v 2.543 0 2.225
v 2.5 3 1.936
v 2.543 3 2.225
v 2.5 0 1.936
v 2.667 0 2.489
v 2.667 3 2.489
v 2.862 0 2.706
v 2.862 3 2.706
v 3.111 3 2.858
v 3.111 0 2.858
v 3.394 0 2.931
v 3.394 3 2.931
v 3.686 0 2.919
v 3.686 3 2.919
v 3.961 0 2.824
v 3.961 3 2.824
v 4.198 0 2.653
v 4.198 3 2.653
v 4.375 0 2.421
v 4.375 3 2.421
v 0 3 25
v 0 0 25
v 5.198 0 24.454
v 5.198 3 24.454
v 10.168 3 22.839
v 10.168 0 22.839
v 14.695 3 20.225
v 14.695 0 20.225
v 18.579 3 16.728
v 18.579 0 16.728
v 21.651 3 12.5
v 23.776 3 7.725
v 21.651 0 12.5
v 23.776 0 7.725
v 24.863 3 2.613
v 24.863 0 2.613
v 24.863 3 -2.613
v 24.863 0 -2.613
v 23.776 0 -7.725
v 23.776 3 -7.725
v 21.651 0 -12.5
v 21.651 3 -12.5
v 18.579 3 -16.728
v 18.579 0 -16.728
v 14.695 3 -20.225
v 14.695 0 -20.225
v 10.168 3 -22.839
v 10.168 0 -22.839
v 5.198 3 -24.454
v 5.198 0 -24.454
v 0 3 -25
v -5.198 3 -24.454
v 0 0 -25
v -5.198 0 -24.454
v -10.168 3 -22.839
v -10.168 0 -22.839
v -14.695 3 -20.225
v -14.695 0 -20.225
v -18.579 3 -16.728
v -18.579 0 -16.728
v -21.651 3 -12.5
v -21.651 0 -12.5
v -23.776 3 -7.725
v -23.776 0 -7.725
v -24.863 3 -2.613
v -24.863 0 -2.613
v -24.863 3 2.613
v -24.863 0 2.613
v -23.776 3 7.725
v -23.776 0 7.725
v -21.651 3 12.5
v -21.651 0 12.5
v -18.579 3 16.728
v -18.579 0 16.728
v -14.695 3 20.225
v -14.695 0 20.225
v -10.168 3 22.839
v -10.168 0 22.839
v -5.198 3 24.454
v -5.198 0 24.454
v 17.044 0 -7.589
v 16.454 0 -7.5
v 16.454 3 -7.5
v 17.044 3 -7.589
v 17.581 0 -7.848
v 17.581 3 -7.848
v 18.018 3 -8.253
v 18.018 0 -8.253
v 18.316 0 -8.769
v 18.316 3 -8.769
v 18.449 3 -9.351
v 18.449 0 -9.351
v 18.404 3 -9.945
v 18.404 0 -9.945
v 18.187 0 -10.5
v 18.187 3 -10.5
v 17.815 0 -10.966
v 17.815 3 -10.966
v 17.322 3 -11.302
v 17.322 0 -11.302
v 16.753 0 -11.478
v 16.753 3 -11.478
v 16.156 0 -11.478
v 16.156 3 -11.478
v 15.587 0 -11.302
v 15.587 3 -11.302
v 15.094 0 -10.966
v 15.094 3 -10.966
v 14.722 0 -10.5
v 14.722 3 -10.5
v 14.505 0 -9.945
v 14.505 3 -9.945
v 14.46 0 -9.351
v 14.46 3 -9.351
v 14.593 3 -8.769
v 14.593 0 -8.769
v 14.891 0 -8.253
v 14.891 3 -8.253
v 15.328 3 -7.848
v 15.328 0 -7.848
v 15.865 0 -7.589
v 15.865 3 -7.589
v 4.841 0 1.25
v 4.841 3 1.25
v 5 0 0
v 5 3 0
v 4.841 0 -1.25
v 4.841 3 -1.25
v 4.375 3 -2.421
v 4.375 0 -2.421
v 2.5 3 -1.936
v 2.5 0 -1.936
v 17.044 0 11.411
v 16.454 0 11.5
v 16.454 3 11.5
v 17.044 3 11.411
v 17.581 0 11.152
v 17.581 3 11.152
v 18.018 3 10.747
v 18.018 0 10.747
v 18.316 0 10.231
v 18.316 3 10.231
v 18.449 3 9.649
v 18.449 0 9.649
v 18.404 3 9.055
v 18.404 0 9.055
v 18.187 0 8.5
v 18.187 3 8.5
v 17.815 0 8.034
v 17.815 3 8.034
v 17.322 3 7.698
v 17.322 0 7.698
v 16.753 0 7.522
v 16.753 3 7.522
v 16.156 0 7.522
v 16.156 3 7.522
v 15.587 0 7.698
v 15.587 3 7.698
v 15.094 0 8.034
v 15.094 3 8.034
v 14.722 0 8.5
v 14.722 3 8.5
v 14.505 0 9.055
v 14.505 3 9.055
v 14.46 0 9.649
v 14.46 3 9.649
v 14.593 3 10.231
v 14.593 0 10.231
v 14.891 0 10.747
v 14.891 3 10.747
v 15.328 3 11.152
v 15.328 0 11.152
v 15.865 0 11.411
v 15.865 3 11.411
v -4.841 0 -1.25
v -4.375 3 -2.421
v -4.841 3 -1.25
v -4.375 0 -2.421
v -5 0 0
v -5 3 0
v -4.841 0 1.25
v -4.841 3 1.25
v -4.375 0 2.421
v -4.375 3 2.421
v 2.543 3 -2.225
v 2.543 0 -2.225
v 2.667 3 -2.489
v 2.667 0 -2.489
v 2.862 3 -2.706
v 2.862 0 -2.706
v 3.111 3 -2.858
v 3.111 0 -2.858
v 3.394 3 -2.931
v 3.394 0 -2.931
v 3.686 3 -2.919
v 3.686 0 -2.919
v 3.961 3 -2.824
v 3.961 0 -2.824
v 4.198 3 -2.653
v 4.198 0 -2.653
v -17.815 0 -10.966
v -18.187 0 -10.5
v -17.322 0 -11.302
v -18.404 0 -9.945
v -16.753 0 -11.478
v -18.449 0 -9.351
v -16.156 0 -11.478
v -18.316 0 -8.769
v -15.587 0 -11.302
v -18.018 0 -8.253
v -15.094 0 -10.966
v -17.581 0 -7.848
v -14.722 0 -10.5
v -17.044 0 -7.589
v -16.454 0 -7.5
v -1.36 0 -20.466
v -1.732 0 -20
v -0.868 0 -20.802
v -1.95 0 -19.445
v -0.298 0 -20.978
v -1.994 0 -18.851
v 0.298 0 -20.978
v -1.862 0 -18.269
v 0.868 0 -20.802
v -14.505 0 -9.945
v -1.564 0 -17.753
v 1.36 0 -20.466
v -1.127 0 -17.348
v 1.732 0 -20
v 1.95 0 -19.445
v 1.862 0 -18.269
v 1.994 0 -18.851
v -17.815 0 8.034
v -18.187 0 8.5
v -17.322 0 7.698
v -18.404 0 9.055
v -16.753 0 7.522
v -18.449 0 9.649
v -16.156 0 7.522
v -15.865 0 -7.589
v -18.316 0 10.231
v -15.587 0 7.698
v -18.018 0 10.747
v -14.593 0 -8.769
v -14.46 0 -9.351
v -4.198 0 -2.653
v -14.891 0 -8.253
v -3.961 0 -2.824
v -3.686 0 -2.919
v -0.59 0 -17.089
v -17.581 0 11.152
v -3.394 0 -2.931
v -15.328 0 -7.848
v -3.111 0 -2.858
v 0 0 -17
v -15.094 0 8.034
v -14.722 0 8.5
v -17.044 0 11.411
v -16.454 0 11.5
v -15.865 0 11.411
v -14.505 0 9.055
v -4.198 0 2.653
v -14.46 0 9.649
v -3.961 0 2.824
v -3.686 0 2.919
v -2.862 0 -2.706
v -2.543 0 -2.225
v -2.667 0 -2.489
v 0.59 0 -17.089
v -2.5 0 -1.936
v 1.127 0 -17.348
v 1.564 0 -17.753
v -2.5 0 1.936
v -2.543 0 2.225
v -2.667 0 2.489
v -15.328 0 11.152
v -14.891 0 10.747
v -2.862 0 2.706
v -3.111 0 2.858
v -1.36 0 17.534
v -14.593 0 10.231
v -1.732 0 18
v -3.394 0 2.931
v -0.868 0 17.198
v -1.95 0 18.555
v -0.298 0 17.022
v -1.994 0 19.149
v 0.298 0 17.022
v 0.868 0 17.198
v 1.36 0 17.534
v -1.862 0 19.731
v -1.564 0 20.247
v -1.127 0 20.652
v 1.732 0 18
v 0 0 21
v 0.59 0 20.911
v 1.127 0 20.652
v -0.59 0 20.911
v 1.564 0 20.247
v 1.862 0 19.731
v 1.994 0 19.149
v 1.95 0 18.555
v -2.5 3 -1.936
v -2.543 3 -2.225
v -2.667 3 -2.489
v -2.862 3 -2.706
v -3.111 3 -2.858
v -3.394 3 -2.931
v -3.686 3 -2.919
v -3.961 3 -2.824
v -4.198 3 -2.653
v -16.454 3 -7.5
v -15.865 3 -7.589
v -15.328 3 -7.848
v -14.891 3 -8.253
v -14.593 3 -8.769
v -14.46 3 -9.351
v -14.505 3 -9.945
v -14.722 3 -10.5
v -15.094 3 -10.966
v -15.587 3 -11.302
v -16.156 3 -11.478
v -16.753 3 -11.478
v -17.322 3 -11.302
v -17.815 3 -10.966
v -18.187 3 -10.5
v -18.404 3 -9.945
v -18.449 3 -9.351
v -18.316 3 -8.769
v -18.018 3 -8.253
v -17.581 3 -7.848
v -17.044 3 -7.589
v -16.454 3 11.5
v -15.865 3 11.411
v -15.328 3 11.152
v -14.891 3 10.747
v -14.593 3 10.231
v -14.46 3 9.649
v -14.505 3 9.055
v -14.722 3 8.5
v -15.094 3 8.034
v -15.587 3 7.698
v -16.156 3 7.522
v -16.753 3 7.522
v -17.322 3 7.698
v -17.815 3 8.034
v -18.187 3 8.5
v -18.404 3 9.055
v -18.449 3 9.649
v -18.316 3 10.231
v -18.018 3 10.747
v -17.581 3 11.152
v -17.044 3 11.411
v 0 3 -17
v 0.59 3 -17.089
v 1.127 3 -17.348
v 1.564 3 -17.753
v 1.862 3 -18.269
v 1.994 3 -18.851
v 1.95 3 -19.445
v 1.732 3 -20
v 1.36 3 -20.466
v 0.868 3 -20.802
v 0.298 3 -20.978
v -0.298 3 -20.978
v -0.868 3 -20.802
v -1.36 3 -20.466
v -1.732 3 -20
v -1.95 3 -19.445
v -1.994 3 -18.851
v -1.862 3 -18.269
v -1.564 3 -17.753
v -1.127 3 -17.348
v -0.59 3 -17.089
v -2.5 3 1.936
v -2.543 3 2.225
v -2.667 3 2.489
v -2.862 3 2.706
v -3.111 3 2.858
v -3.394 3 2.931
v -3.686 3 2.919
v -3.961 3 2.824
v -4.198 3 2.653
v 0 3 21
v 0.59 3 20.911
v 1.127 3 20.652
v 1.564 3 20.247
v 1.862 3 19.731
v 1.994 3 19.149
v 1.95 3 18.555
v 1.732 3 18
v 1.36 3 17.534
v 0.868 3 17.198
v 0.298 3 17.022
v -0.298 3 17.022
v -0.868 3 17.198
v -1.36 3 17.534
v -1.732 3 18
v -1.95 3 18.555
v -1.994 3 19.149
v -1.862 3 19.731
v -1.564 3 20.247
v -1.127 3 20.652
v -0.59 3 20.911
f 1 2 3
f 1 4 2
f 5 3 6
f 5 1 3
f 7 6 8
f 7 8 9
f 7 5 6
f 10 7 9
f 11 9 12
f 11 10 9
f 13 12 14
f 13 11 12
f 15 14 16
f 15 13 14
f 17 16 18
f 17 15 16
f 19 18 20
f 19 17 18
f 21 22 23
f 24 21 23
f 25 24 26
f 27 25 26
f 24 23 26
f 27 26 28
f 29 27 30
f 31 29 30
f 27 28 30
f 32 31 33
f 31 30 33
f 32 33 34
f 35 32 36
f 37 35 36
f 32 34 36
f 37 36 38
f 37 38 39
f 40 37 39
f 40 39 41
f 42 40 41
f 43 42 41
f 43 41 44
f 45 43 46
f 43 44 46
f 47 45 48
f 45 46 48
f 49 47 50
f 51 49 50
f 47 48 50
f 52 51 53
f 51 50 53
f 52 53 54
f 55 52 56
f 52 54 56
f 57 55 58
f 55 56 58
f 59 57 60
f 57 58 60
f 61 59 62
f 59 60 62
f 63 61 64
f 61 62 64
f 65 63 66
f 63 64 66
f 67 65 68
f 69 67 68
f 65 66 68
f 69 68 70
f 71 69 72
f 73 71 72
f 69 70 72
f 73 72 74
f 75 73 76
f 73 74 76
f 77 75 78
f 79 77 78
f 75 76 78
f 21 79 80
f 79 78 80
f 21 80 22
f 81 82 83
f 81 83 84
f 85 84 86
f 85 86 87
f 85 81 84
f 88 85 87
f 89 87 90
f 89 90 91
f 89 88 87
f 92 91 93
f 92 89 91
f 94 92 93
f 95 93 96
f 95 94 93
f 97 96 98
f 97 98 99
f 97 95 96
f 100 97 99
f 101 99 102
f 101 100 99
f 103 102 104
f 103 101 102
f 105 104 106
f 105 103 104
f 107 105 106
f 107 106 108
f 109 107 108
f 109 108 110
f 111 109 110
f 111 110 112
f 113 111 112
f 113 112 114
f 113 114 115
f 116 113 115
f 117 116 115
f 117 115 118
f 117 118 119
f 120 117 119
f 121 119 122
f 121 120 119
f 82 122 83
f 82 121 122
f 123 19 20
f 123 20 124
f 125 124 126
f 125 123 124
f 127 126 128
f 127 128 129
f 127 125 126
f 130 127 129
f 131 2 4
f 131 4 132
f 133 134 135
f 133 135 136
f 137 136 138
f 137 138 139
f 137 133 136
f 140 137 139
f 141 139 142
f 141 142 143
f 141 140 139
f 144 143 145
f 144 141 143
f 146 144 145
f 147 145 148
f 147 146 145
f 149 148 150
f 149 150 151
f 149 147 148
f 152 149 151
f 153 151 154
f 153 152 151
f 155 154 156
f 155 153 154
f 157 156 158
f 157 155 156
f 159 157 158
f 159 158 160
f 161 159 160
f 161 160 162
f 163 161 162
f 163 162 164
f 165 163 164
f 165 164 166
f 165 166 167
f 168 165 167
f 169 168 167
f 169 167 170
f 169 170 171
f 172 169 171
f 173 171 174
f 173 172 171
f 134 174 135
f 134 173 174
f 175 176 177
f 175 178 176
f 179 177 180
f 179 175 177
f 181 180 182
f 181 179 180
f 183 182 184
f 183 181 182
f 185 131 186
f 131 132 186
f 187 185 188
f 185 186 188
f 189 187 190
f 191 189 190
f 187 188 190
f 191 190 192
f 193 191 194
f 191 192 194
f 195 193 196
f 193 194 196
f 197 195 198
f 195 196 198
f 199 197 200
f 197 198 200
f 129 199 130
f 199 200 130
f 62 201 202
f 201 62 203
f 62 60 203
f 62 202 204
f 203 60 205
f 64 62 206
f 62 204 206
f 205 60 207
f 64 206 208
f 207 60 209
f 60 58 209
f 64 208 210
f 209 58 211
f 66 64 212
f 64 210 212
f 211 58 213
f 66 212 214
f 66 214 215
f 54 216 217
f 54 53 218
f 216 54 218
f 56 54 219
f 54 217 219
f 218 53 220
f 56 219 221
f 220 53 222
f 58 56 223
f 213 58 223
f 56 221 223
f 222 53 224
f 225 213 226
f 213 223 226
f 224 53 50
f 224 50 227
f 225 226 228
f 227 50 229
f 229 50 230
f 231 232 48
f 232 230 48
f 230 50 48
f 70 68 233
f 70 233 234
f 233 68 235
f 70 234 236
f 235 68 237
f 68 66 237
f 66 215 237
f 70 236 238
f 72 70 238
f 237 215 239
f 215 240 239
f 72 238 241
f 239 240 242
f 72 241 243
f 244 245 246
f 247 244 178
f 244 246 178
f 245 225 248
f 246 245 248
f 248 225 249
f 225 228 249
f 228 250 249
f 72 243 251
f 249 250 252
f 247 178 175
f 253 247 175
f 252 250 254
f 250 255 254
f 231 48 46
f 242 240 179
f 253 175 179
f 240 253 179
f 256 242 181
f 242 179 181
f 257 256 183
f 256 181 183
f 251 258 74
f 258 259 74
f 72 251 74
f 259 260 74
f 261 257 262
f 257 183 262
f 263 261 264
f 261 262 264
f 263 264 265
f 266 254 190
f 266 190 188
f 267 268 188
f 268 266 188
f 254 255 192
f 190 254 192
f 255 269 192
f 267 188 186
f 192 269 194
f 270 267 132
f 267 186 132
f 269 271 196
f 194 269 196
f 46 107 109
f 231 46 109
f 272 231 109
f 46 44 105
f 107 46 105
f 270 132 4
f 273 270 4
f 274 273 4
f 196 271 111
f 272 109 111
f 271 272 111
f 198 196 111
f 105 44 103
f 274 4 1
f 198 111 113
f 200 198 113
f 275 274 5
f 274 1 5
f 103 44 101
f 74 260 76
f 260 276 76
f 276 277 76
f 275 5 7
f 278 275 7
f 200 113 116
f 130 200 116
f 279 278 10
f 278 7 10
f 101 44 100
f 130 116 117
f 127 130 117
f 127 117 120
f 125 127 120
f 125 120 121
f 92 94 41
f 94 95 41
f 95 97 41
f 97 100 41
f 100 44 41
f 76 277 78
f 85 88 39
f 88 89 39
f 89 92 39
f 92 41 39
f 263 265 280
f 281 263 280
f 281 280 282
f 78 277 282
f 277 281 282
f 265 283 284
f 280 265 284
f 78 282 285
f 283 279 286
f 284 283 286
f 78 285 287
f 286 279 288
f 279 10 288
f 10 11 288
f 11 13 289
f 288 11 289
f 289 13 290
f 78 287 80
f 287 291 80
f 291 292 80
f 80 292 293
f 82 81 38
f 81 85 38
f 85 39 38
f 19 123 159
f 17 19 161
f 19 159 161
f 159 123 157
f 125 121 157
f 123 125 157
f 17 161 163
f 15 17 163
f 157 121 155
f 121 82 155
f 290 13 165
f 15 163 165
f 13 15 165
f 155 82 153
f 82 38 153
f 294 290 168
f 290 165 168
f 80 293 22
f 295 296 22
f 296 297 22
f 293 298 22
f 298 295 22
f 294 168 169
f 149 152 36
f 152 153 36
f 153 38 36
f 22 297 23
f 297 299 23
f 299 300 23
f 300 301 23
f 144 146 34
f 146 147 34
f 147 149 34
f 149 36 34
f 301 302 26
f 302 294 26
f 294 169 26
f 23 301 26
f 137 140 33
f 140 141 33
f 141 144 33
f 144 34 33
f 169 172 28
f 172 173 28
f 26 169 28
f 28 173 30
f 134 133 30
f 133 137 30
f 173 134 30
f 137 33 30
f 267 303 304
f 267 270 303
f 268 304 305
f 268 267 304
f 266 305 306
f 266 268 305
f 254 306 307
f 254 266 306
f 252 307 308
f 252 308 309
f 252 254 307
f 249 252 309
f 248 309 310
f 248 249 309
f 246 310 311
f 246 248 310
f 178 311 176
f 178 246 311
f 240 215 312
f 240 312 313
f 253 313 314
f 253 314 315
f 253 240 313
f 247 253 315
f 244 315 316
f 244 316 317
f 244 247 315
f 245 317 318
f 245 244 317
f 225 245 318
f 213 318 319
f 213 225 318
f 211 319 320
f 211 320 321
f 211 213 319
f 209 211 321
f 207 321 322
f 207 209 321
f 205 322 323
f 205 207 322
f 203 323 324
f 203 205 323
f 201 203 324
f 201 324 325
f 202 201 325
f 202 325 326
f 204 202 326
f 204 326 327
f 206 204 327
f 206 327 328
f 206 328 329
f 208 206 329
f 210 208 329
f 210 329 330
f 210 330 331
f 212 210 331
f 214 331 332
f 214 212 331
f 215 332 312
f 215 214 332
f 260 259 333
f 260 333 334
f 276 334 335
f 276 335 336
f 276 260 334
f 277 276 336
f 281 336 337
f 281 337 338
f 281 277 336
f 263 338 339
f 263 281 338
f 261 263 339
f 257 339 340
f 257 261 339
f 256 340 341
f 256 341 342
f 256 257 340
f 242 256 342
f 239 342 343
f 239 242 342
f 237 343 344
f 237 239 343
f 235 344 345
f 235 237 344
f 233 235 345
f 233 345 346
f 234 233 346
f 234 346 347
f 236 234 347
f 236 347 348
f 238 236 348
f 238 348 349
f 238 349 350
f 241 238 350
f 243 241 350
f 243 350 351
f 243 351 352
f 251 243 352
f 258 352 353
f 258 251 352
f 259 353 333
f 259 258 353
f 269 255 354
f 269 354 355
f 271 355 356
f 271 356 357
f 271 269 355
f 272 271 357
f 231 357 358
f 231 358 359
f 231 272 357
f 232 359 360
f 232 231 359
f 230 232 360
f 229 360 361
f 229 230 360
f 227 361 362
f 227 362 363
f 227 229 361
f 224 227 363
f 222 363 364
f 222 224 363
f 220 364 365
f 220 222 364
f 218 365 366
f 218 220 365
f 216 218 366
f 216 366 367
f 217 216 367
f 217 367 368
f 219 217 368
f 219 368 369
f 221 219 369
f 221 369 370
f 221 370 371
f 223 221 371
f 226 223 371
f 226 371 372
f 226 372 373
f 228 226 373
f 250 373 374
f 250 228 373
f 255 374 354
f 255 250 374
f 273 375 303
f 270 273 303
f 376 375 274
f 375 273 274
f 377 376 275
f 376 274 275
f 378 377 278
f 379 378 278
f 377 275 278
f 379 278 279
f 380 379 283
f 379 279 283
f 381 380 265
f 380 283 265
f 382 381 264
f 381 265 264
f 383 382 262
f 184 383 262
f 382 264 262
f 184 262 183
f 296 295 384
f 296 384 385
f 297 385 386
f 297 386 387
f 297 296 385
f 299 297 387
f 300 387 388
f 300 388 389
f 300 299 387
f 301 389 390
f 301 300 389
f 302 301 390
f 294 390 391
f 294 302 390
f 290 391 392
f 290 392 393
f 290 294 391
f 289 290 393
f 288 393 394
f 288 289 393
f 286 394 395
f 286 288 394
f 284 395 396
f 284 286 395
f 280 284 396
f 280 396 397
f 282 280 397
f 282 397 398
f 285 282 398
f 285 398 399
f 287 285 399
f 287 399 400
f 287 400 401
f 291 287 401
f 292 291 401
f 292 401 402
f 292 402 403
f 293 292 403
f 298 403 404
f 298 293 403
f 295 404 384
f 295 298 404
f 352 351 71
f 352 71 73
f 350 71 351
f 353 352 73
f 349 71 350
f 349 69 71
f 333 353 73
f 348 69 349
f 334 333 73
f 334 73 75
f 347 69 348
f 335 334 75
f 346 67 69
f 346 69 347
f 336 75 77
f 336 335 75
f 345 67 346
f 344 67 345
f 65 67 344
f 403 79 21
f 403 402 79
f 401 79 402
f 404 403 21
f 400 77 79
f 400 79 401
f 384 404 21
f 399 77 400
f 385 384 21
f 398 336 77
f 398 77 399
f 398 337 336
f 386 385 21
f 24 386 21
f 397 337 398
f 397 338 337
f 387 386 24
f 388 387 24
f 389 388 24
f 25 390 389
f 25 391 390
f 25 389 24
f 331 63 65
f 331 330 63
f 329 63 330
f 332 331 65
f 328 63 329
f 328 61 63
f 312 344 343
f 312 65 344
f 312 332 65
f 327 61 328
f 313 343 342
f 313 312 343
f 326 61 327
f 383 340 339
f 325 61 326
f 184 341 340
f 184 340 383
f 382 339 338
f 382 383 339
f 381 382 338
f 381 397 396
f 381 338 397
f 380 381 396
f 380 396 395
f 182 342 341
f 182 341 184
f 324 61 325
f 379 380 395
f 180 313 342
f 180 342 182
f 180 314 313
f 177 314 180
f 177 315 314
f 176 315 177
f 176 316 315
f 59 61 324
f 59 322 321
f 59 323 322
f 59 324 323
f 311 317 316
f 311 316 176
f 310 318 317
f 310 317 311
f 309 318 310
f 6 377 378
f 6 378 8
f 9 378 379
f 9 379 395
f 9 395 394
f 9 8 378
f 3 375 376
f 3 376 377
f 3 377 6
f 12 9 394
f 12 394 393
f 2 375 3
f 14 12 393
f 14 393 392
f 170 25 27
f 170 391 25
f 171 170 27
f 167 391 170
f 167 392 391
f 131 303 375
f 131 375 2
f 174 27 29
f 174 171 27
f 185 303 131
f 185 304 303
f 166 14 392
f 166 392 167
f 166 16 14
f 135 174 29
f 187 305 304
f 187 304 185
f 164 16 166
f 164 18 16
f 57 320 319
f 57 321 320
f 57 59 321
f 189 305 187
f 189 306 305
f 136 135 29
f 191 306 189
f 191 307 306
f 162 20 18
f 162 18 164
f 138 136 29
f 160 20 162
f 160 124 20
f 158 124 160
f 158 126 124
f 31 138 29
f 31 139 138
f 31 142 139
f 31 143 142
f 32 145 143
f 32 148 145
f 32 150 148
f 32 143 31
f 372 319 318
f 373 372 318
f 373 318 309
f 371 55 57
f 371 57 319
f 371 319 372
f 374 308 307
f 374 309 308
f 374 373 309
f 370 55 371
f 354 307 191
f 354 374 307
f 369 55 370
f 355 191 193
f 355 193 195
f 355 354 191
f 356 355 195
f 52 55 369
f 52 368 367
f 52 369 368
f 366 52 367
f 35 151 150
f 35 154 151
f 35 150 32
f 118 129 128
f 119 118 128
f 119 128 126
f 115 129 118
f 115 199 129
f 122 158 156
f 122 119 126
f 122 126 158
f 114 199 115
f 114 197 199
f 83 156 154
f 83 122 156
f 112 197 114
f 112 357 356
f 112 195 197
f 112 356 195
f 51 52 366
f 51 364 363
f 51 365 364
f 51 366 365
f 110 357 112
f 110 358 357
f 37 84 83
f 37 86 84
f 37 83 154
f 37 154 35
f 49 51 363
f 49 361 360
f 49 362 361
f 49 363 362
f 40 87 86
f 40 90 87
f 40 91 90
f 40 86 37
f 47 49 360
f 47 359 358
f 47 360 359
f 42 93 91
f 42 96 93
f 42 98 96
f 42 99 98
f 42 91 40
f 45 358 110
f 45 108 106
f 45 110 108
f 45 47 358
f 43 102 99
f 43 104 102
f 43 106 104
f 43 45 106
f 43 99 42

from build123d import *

# Parameters (mm, degrees)
SKETCH_1_R      = 25
SKETCH_1_R_2    = 2
SKETCH_1_R_3    = 5
EXTRUDE_1_DEPTH = 3
SKETCH_2_W      = 5
SKETCH_2_H      = 12
EXTRUDE_2_DEPTH = 3
FILLET_1_R      = 1


with BuildPart() as part:
    # 草图1 → 凸台-拉伸1 (new body)
    with BuildSketch(Plane(origin=(0, 0, 0), x_dir=(1, 0, 0), z_dir=(0, 1, 0))):
        with Locations(Location((0, 0, 0), (0, 0, 270))):
            Circle(SKETCH_1_R)
        with Locations(Location((0, 19, 0), (0, 0, 270))):
            Circle(SKETCH_1_R_2, mode=Mode.SUBTRACT)
        with Locations(Location((16.454482672, 9.5, 0), (0, 0, 270))):
            Circle(SKETCH_1_R_2, mode=Mode.SUBTRACT)
        with Locations(Location((16.454482672, -9.5, 0), (0, 0, 270))):
            Circle(SKETCH_1_R_2, mode=Mode.SUBTRACT)
        with Locations(Location((0, -19, 0), (0, 0, 270))):
            Circle(SKETCH_1_R_2, mode=Mode.SUBTRACT)
        with Locations(Location((-16.454482672, -9.5, 0), (0, 0, 270))):
            Circle(SKETCH_1_R_2, mode=Mode.SUBTRACT)
        with Locations(Location((-16.454482672, 9.5, 0), (0, 0, 270))):
            Circle(SKETCH_1_R_2, mode=Mode.SUBTRACT)
        with Locations(Location((0, 0, 0), (0, 0, 270))):
            Circle(SKETCH_1_R_3, mode=Mode.SUBTRACT)
    extrude(amount=EXTRUDE_1_DEPTH)

    # 草图2 → 凸台-拉伸2 (add)
    with BuildSketch(Plane(origin=(0, 3, 0), x_dir=(1, 0, 0), z_dir=(0, 1, 0))):
        Rectangle(SKETCH_2_W, SKETCH_2_H)
    extrude(amount=-EXTRUDE_2_DEPTH)

    # 圆角1
    fillet_1_edges = [part.edges().sort_by_distance(p)[0] for p in [
        (-2.5, 1.5, 4.330127019),
        (-2.5, 1.5, -4.330127019),
        (2.5, 1.5, -4.330127019),
        (2.5, 1.5, 4.330127019),
    ]]
    fillet(fillet_1_edges, radius=FILLET_1_R)


solid = part.part
